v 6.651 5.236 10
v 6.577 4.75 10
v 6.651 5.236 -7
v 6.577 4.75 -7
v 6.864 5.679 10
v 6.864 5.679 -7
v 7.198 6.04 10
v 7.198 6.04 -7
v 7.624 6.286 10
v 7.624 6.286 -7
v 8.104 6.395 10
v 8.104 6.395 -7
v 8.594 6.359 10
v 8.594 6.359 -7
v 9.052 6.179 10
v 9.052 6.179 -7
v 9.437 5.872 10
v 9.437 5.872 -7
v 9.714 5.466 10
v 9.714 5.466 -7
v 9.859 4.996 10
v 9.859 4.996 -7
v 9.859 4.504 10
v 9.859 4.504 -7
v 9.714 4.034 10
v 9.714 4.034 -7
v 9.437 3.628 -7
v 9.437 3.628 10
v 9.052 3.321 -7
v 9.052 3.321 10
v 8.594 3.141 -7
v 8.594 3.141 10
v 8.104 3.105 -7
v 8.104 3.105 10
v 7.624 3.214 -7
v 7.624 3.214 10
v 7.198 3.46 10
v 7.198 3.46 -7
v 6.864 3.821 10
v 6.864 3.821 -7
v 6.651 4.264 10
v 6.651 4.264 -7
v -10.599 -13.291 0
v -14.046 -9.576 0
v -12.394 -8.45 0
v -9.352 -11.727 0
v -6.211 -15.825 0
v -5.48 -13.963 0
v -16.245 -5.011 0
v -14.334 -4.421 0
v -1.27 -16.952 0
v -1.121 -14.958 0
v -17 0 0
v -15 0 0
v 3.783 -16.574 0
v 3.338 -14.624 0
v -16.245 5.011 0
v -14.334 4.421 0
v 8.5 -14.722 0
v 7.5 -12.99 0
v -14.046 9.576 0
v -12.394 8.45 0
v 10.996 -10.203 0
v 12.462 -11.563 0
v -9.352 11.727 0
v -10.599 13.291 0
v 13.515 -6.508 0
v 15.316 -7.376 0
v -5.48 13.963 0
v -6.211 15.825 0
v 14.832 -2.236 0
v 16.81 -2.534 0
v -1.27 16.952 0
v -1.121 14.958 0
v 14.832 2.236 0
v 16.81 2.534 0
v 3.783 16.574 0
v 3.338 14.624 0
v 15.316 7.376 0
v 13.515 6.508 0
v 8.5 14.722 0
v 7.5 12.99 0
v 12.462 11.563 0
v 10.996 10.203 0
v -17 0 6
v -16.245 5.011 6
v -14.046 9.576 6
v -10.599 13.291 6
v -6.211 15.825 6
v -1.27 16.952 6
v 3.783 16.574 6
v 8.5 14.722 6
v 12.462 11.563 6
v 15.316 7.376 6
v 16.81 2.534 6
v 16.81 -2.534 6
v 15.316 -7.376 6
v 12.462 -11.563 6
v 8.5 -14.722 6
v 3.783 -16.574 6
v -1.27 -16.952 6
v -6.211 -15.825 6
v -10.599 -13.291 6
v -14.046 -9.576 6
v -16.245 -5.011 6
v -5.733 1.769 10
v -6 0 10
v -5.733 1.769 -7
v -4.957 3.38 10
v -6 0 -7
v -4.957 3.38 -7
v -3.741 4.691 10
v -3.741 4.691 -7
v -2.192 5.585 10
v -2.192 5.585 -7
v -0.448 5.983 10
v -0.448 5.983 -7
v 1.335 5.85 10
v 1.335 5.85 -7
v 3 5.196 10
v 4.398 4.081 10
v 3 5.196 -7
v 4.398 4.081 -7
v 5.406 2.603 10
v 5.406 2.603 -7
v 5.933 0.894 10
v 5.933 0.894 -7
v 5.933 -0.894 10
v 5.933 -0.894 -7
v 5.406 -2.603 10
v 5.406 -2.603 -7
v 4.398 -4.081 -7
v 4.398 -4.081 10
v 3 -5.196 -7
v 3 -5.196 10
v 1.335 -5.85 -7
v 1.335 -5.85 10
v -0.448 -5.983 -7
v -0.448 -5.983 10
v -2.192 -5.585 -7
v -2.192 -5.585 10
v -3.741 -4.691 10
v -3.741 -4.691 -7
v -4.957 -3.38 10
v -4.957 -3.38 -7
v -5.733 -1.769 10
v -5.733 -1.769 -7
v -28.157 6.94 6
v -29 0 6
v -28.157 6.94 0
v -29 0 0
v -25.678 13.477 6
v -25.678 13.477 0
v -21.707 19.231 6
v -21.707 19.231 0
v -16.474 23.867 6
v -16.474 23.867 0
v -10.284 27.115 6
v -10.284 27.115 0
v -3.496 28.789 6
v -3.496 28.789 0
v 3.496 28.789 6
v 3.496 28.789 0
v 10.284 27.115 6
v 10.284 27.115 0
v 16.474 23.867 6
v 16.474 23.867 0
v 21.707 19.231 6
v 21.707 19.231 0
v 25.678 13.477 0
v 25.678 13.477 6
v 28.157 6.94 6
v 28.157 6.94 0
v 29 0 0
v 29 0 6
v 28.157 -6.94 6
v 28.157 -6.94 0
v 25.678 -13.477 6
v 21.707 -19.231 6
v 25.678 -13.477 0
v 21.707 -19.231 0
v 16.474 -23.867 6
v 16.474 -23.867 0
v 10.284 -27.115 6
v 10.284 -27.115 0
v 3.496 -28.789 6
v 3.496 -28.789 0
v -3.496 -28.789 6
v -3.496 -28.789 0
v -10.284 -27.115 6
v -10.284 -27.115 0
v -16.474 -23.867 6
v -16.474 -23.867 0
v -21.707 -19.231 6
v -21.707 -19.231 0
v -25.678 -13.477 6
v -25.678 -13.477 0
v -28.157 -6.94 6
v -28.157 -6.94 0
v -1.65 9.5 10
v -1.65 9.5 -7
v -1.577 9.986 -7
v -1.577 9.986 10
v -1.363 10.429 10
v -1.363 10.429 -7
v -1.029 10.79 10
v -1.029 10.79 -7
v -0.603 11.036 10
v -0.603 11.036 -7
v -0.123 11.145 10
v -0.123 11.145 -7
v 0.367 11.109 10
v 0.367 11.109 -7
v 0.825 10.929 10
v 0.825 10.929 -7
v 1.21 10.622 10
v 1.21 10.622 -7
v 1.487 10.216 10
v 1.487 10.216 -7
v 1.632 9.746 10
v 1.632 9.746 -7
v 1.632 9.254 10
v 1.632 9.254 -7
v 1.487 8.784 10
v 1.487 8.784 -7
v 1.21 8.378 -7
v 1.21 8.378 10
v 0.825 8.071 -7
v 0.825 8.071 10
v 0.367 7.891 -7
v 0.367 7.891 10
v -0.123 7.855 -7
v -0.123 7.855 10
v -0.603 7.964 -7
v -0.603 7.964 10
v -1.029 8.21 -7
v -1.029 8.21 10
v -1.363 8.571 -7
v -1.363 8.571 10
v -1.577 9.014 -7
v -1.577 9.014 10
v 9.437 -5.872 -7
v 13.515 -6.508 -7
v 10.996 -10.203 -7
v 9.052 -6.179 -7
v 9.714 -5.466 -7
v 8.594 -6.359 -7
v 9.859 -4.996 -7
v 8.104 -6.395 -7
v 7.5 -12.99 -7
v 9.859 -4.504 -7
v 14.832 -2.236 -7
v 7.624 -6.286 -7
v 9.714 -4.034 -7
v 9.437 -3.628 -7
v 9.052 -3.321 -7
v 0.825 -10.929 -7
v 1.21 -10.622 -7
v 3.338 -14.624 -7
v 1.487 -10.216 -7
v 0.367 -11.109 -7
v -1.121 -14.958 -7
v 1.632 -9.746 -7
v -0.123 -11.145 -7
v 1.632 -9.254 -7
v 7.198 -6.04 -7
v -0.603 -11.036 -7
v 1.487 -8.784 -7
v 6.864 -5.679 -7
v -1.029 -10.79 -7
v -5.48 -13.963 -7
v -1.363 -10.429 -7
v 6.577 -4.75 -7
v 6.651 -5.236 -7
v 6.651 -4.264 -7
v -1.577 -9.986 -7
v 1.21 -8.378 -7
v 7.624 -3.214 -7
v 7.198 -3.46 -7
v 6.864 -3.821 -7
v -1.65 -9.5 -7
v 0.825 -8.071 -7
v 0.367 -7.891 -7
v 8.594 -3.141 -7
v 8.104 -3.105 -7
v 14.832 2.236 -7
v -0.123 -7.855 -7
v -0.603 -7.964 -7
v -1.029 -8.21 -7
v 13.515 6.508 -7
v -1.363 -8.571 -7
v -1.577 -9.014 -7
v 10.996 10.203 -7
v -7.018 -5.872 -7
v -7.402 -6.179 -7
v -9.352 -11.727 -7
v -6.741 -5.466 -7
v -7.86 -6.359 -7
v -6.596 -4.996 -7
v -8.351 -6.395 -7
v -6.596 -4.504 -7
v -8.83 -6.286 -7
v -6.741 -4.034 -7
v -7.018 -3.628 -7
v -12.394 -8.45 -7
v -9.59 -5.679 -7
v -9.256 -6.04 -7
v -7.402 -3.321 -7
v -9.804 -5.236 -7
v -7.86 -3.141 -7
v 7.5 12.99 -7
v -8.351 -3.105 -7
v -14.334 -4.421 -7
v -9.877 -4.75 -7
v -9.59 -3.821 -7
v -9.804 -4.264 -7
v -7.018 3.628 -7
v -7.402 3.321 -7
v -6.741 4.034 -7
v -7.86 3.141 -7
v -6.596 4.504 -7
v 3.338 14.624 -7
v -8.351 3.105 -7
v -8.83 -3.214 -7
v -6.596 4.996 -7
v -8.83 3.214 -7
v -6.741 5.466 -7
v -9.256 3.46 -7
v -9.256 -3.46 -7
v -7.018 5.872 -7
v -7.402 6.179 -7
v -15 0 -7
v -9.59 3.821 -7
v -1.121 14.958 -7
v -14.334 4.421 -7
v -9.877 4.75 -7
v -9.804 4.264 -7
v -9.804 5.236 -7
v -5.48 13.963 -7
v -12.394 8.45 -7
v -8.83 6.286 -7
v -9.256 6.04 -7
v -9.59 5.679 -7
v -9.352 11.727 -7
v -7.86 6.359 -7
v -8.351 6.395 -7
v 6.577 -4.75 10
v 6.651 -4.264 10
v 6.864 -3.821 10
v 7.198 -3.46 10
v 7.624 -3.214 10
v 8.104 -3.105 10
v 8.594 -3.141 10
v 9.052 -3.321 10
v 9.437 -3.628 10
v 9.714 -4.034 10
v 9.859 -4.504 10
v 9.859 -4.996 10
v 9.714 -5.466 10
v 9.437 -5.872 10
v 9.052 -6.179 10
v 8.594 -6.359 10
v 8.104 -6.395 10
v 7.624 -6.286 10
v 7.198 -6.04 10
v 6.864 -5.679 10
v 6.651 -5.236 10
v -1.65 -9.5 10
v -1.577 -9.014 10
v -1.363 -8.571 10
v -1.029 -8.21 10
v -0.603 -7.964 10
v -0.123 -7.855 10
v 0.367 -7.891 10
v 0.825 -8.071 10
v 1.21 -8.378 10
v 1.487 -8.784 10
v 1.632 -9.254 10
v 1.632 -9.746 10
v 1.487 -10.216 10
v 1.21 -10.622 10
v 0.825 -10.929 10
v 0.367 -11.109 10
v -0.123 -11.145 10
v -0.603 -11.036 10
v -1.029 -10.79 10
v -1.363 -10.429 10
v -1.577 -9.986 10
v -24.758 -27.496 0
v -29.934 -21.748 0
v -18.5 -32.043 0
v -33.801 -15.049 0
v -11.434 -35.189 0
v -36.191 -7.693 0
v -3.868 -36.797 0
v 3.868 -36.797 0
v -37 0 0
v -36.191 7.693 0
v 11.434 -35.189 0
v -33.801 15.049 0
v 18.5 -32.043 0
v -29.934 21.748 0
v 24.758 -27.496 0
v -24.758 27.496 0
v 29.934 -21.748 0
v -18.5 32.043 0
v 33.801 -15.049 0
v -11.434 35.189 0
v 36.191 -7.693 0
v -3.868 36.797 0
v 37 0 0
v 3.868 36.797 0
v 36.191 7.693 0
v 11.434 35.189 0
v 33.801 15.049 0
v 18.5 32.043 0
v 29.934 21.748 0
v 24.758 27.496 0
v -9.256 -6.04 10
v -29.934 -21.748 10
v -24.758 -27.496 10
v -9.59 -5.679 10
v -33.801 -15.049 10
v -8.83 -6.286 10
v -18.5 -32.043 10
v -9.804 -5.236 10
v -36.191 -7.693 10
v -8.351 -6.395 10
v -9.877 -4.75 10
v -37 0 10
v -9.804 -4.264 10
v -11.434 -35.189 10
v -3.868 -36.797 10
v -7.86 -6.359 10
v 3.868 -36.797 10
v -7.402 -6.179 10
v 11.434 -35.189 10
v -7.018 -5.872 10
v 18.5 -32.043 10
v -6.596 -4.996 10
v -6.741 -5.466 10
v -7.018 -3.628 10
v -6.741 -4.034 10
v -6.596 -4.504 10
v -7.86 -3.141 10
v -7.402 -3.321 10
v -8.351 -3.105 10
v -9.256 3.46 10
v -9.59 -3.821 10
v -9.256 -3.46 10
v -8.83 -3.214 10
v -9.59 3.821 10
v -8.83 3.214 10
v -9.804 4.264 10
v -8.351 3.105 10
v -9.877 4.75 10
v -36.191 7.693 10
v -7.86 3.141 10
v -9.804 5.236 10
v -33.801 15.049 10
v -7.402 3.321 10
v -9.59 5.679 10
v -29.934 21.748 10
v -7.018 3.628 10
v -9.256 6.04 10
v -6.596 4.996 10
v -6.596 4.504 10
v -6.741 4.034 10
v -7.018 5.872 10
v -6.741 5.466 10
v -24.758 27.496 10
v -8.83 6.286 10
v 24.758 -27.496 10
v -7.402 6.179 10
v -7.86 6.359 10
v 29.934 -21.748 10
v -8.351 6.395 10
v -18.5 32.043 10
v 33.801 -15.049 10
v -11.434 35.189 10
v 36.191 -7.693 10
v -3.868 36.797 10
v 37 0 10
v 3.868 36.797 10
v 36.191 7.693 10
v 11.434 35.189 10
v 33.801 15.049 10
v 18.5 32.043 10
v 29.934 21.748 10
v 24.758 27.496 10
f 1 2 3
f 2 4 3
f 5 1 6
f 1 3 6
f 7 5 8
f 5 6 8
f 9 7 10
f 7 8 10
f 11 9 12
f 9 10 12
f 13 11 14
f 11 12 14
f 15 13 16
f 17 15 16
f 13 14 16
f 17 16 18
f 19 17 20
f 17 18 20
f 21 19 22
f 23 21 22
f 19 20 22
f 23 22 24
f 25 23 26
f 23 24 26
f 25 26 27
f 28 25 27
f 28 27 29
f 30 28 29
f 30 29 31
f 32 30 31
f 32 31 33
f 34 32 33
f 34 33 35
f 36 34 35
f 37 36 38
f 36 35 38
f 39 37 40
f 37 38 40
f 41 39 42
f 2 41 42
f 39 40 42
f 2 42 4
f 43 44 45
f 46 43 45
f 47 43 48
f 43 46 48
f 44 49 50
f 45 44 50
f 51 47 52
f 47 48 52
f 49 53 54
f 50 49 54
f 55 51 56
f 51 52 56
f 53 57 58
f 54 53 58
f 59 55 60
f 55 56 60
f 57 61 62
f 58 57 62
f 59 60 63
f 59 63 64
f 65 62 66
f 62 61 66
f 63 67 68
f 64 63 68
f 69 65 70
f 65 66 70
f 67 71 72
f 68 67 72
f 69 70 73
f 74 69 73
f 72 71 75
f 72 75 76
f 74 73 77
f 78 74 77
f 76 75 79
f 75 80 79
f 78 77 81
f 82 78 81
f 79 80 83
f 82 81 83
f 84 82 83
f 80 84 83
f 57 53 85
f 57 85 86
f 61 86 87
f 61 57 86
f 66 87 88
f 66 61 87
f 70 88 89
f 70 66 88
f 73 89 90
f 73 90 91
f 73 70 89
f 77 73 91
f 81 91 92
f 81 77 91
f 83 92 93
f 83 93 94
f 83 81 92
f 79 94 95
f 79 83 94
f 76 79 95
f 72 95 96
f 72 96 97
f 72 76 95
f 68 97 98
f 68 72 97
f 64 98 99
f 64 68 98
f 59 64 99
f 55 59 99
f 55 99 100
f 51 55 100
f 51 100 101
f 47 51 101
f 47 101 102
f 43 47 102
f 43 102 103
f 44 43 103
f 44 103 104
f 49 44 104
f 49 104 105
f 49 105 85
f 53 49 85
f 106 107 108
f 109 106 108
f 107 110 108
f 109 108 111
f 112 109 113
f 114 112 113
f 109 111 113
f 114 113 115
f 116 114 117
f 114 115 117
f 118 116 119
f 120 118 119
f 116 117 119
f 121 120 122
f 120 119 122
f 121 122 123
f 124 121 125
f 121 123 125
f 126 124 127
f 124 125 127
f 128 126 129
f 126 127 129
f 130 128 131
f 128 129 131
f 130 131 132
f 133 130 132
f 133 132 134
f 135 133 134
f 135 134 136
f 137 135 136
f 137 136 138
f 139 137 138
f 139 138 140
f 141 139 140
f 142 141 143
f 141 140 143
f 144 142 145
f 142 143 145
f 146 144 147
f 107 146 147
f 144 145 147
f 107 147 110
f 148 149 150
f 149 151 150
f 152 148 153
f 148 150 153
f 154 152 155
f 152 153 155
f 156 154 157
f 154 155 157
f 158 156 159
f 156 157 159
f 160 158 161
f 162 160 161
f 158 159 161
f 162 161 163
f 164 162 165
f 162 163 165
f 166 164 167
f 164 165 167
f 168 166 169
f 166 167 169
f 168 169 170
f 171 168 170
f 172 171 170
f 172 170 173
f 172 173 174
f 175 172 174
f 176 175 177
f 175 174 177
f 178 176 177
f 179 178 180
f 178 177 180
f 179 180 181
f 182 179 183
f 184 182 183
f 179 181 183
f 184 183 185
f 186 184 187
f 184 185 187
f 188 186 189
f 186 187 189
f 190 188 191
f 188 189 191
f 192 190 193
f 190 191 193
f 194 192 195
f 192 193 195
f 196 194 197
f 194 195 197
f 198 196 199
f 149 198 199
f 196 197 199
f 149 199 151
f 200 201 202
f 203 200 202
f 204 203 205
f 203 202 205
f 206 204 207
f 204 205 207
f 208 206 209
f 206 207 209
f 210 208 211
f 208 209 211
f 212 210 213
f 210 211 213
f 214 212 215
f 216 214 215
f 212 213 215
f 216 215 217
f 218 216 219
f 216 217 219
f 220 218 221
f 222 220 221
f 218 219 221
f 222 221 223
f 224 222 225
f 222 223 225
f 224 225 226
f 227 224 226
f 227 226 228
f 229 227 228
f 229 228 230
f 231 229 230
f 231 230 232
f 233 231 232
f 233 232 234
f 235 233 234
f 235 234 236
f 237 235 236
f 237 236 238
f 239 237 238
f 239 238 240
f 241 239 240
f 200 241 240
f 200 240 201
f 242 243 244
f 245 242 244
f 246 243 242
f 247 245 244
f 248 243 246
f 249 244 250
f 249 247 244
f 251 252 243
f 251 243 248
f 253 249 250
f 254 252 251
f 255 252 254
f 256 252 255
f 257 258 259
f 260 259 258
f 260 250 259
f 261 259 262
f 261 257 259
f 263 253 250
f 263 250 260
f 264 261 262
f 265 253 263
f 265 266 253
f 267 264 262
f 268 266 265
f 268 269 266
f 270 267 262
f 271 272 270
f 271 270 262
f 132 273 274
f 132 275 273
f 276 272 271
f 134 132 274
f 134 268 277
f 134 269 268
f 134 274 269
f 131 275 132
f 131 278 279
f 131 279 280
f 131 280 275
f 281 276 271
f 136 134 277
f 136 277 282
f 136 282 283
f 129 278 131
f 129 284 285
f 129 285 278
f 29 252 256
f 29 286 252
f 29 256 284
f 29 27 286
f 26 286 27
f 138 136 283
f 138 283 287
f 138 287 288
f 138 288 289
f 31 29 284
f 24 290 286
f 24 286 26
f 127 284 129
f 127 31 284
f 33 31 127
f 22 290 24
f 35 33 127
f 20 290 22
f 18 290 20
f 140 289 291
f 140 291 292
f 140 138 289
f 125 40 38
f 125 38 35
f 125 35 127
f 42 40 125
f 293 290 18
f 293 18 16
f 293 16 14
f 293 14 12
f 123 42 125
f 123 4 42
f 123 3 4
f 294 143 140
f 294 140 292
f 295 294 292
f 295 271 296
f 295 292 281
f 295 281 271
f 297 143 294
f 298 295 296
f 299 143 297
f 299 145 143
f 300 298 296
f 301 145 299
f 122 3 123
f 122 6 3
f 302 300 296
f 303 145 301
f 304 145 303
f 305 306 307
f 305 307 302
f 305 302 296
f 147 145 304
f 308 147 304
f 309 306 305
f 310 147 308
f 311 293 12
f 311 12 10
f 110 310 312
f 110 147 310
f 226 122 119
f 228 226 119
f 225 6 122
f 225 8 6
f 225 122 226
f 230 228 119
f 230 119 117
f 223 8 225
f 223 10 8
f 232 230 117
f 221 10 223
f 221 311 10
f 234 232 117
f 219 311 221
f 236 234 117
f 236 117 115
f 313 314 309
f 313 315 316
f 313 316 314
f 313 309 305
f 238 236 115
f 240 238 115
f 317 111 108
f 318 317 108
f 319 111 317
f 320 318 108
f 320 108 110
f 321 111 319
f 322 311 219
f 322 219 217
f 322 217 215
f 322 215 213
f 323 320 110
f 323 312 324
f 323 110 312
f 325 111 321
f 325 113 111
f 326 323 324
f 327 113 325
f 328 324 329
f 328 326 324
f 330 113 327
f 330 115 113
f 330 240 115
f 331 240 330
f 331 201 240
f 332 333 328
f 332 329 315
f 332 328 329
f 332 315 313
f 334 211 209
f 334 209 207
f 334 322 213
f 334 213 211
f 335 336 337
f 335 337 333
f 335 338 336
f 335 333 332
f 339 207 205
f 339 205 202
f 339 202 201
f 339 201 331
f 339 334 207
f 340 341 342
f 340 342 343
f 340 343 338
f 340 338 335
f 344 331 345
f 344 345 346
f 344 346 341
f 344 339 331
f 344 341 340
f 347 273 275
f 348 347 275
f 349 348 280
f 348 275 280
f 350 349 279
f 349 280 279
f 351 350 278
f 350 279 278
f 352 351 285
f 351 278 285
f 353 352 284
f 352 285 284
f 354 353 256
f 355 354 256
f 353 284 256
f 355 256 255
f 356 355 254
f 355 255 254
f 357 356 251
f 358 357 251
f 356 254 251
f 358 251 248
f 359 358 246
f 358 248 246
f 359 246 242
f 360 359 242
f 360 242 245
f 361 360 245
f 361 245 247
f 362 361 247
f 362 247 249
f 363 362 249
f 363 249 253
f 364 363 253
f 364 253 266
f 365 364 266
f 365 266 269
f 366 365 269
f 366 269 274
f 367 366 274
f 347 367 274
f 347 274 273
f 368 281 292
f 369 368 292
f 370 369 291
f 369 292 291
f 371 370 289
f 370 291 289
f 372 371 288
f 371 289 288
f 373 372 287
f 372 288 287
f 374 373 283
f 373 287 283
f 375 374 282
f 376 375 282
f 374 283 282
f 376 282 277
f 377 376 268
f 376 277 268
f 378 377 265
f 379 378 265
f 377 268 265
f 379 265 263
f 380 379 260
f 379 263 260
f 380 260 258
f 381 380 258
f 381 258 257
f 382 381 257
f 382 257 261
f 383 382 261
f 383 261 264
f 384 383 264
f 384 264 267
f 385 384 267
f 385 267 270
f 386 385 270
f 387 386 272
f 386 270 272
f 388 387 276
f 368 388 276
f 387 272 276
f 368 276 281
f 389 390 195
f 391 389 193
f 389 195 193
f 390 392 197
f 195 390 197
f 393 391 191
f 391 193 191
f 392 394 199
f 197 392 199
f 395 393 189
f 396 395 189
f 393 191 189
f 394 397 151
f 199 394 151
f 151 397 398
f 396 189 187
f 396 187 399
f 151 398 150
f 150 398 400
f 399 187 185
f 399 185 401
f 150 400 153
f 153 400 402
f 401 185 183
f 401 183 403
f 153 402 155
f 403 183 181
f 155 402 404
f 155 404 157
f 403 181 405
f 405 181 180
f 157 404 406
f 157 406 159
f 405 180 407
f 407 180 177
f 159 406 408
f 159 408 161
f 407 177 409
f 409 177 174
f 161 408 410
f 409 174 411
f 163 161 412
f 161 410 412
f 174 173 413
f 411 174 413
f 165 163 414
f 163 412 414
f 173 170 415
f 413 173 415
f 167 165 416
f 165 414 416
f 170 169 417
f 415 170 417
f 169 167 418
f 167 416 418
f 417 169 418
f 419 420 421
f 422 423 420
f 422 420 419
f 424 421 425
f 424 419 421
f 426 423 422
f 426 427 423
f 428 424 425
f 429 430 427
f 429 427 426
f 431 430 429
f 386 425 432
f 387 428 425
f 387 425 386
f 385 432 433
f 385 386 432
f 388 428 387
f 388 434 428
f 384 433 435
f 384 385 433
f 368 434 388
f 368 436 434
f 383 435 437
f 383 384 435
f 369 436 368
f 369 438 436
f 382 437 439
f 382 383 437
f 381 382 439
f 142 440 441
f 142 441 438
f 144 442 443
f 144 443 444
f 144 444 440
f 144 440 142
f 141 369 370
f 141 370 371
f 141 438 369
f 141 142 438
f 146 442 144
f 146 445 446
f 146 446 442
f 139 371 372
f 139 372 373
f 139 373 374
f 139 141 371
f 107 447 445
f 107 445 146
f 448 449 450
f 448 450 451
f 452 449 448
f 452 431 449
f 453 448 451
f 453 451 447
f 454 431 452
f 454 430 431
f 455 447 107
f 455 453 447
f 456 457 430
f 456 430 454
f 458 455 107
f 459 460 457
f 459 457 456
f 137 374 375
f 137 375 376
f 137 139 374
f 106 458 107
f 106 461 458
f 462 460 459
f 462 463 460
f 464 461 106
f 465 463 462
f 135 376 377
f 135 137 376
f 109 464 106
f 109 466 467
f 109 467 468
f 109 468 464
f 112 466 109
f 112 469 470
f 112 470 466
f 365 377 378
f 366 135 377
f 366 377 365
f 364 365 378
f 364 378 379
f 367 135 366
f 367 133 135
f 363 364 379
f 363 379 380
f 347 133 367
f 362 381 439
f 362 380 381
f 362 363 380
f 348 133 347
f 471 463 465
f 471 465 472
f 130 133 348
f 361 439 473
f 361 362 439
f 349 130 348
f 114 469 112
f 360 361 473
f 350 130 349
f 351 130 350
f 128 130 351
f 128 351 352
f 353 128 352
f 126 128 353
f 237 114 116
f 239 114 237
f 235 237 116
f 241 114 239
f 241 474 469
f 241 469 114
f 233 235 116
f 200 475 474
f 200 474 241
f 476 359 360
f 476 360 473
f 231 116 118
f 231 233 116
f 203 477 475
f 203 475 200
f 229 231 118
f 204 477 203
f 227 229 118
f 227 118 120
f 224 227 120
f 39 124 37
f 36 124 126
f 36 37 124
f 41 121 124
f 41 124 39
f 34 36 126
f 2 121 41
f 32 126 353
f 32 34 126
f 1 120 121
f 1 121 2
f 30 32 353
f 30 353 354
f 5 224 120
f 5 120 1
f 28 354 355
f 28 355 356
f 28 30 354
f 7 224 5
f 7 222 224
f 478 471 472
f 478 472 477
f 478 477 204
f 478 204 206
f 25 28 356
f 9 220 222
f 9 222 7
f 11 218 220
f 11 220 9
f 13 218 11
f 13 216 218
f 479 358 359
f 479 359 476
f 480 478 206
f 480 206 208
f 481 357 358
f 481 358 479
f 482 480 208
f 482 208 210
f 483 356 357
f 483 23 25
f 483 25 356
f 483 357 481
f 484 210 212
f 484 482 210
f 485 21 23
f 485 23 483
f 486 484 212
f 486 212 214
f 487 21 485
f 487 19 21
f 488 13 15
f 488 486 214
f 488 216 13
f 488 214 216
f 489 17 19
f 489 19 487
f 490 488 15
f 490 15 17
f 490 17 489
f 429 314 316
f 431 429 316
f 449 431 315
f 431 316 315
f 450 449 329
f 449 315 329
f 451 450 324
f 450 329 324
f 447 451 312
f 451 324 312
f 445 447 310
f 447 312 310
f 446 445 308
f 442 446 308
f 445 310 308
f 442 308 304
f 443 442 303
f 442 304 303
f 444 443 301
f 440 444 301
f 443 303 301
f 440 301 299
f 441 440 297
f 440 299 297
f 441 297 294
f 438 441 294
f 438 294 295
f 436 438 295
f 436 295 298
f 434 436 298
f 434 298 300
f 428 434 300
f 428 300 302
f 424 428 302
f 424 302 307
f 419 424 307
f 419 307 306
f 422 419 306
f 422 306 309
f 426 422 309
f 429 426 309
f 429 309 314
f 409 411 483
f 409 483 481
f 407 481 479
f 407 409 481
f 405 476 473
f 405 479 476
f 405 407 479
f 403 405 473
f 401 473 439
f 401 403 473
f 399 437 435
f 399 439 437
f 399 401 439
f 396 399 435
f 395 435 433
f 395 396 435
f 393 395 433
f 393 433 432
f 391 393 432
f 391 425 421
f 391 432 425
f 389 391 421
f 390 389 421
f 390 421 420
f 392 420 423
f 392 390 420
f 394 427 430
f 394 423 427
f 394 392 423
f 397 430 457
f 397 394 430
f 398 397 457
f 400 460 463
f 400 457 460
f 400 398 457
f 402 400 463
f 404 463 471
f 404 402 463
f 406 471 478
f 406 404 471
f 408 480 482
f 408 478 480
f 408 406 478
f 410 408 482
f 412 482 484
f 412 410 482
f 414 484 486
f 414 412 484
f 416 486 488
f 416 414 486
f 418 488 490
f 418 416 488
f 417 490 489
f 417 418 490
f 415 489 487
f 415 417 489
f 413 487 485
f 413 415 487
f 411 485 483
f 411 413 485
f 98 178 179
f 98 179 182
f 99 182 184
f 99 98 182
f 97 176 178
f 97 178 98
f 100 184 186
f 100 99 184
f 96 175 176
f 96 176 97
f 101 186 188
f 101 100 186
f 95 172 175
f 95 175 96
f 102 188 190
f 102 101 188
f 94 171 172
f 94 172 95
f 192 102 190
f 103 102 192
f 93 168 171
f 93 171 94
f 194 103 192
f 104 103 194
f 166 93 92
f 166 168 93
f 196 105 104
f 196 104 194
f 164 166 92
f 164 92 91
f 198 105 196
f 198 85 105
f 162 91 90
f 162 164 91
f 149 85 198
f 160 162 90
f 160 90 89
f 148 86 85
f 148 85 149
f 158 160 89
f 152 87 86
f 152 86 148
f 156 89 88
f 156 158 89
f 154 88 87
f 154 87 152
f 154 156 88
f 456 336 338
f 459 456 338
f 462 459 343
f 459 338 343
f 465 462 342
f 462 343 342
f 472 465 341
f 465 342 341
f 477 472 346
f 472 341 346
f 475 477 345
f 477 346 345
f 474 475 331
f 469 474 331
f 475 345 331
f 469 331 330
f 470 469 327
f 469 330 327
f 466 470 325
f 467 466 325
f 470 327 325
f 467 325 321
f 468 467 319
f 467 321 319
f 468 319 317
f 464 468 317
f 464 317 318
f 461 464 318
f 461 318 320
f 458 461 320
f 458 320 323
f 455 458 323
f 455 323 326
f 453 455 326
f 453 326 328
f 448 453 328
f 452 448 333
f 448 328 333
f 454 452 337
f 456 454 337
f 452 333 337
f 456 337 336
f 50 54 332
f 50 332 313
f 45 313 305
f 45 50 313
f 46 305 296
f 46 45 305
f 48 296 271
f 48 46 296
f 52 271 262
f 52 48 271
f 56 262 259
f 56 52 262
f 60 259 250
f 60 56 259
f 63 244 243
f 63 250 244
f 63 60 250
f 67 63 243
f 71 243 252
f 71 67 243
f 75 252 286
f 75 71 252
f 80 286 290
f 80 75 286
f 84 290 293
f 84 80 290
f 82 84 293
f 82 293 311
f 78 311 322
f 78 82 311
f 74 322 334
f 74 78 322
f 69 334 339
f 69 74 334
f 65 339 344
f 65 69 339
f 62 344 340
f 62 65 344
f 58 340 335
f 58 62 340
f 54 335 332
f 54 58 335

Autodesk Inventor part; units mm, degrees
ref_plane "YZ Plane" through (0, 0, 0) normal (1, 0, 0) x (0, 1, 0)
ref_plane "XZ Plane" through (0, 0, 0) normal (0, 1, 0) x (-1, 0, 0)
ref_plane "XY Plane" through (0, 0, 0) normal (0, 0, 1) x (1, 0, 0)
sketch "Sketch1" plane through (0, 0, 0) normal (0, 0, 1) x (1, 0, 0)
  circle A0 centre (0, 0) radius 37
  dimension "d0" = 74
extrude "Extrusion1" add sketch "Sketch1" along normal blind 10
sketch "Sketch4" plane through (0, 0, 0) normal (0, 0, -1) x (-1, 0, 0)
  circle A0 centre (0, 0) radius 29
  circle A1 centre (0, 0) radius 17
  circle A2 centre (0, 0) radius 37 projected
  dimension "d5" = 8
  dimension "d6" = 34
extrude "Extrusion3" cut sketch "Sketch4" against normal blind 6 contours A0
sketch "Sketch6" plane through (0, 0, 0) normal (0, 0, -1) x (-1, 0, 0)
  circle A0 centre (0, 0) radius 15
  dimension "d9" = 30
extrude "Extrusion4" add sketch "Sketch6" along normal blind 7
sketch "Sketch8" plane through (0, 0, -7) normal (0, 0, -1) x (-1, 0, 0)
  circle A0 centre (0, 0) radius 9.5
  circle A1 centre (0, 9.5) radius 1.65
  circle A2 centre (-8.2272, 4.75) radius 1.65
  circle A3 centre (-8.2272, -4.75) radius 1.65
  circle A4 centre (0, 0) radius 6
  circle A5 centre (0, -9.5) radius 1.65
  circle A6 centre (8.2272, -4.75) radius 1.65
  circle A7 centre (8.2272, 4.75) radius 1.65
  dimension "d16" = 19
  dimension "d17" = 3.3
  dimension "d20" = 360
  dimension "d24" = 12
extrude "Extrusion6" cut sketch "Sketch8" against normal through all contours A7 A0 | A0 A7 | A6 A0 | A0 A6 | A1 A0 | A0 A1 | A5 A0 | A0 A5 | A2 A0 | A0 A2 | A3 A0 | A0 A3 | A4
properties part number "rotor_hub" material "Aluminum 6061"
